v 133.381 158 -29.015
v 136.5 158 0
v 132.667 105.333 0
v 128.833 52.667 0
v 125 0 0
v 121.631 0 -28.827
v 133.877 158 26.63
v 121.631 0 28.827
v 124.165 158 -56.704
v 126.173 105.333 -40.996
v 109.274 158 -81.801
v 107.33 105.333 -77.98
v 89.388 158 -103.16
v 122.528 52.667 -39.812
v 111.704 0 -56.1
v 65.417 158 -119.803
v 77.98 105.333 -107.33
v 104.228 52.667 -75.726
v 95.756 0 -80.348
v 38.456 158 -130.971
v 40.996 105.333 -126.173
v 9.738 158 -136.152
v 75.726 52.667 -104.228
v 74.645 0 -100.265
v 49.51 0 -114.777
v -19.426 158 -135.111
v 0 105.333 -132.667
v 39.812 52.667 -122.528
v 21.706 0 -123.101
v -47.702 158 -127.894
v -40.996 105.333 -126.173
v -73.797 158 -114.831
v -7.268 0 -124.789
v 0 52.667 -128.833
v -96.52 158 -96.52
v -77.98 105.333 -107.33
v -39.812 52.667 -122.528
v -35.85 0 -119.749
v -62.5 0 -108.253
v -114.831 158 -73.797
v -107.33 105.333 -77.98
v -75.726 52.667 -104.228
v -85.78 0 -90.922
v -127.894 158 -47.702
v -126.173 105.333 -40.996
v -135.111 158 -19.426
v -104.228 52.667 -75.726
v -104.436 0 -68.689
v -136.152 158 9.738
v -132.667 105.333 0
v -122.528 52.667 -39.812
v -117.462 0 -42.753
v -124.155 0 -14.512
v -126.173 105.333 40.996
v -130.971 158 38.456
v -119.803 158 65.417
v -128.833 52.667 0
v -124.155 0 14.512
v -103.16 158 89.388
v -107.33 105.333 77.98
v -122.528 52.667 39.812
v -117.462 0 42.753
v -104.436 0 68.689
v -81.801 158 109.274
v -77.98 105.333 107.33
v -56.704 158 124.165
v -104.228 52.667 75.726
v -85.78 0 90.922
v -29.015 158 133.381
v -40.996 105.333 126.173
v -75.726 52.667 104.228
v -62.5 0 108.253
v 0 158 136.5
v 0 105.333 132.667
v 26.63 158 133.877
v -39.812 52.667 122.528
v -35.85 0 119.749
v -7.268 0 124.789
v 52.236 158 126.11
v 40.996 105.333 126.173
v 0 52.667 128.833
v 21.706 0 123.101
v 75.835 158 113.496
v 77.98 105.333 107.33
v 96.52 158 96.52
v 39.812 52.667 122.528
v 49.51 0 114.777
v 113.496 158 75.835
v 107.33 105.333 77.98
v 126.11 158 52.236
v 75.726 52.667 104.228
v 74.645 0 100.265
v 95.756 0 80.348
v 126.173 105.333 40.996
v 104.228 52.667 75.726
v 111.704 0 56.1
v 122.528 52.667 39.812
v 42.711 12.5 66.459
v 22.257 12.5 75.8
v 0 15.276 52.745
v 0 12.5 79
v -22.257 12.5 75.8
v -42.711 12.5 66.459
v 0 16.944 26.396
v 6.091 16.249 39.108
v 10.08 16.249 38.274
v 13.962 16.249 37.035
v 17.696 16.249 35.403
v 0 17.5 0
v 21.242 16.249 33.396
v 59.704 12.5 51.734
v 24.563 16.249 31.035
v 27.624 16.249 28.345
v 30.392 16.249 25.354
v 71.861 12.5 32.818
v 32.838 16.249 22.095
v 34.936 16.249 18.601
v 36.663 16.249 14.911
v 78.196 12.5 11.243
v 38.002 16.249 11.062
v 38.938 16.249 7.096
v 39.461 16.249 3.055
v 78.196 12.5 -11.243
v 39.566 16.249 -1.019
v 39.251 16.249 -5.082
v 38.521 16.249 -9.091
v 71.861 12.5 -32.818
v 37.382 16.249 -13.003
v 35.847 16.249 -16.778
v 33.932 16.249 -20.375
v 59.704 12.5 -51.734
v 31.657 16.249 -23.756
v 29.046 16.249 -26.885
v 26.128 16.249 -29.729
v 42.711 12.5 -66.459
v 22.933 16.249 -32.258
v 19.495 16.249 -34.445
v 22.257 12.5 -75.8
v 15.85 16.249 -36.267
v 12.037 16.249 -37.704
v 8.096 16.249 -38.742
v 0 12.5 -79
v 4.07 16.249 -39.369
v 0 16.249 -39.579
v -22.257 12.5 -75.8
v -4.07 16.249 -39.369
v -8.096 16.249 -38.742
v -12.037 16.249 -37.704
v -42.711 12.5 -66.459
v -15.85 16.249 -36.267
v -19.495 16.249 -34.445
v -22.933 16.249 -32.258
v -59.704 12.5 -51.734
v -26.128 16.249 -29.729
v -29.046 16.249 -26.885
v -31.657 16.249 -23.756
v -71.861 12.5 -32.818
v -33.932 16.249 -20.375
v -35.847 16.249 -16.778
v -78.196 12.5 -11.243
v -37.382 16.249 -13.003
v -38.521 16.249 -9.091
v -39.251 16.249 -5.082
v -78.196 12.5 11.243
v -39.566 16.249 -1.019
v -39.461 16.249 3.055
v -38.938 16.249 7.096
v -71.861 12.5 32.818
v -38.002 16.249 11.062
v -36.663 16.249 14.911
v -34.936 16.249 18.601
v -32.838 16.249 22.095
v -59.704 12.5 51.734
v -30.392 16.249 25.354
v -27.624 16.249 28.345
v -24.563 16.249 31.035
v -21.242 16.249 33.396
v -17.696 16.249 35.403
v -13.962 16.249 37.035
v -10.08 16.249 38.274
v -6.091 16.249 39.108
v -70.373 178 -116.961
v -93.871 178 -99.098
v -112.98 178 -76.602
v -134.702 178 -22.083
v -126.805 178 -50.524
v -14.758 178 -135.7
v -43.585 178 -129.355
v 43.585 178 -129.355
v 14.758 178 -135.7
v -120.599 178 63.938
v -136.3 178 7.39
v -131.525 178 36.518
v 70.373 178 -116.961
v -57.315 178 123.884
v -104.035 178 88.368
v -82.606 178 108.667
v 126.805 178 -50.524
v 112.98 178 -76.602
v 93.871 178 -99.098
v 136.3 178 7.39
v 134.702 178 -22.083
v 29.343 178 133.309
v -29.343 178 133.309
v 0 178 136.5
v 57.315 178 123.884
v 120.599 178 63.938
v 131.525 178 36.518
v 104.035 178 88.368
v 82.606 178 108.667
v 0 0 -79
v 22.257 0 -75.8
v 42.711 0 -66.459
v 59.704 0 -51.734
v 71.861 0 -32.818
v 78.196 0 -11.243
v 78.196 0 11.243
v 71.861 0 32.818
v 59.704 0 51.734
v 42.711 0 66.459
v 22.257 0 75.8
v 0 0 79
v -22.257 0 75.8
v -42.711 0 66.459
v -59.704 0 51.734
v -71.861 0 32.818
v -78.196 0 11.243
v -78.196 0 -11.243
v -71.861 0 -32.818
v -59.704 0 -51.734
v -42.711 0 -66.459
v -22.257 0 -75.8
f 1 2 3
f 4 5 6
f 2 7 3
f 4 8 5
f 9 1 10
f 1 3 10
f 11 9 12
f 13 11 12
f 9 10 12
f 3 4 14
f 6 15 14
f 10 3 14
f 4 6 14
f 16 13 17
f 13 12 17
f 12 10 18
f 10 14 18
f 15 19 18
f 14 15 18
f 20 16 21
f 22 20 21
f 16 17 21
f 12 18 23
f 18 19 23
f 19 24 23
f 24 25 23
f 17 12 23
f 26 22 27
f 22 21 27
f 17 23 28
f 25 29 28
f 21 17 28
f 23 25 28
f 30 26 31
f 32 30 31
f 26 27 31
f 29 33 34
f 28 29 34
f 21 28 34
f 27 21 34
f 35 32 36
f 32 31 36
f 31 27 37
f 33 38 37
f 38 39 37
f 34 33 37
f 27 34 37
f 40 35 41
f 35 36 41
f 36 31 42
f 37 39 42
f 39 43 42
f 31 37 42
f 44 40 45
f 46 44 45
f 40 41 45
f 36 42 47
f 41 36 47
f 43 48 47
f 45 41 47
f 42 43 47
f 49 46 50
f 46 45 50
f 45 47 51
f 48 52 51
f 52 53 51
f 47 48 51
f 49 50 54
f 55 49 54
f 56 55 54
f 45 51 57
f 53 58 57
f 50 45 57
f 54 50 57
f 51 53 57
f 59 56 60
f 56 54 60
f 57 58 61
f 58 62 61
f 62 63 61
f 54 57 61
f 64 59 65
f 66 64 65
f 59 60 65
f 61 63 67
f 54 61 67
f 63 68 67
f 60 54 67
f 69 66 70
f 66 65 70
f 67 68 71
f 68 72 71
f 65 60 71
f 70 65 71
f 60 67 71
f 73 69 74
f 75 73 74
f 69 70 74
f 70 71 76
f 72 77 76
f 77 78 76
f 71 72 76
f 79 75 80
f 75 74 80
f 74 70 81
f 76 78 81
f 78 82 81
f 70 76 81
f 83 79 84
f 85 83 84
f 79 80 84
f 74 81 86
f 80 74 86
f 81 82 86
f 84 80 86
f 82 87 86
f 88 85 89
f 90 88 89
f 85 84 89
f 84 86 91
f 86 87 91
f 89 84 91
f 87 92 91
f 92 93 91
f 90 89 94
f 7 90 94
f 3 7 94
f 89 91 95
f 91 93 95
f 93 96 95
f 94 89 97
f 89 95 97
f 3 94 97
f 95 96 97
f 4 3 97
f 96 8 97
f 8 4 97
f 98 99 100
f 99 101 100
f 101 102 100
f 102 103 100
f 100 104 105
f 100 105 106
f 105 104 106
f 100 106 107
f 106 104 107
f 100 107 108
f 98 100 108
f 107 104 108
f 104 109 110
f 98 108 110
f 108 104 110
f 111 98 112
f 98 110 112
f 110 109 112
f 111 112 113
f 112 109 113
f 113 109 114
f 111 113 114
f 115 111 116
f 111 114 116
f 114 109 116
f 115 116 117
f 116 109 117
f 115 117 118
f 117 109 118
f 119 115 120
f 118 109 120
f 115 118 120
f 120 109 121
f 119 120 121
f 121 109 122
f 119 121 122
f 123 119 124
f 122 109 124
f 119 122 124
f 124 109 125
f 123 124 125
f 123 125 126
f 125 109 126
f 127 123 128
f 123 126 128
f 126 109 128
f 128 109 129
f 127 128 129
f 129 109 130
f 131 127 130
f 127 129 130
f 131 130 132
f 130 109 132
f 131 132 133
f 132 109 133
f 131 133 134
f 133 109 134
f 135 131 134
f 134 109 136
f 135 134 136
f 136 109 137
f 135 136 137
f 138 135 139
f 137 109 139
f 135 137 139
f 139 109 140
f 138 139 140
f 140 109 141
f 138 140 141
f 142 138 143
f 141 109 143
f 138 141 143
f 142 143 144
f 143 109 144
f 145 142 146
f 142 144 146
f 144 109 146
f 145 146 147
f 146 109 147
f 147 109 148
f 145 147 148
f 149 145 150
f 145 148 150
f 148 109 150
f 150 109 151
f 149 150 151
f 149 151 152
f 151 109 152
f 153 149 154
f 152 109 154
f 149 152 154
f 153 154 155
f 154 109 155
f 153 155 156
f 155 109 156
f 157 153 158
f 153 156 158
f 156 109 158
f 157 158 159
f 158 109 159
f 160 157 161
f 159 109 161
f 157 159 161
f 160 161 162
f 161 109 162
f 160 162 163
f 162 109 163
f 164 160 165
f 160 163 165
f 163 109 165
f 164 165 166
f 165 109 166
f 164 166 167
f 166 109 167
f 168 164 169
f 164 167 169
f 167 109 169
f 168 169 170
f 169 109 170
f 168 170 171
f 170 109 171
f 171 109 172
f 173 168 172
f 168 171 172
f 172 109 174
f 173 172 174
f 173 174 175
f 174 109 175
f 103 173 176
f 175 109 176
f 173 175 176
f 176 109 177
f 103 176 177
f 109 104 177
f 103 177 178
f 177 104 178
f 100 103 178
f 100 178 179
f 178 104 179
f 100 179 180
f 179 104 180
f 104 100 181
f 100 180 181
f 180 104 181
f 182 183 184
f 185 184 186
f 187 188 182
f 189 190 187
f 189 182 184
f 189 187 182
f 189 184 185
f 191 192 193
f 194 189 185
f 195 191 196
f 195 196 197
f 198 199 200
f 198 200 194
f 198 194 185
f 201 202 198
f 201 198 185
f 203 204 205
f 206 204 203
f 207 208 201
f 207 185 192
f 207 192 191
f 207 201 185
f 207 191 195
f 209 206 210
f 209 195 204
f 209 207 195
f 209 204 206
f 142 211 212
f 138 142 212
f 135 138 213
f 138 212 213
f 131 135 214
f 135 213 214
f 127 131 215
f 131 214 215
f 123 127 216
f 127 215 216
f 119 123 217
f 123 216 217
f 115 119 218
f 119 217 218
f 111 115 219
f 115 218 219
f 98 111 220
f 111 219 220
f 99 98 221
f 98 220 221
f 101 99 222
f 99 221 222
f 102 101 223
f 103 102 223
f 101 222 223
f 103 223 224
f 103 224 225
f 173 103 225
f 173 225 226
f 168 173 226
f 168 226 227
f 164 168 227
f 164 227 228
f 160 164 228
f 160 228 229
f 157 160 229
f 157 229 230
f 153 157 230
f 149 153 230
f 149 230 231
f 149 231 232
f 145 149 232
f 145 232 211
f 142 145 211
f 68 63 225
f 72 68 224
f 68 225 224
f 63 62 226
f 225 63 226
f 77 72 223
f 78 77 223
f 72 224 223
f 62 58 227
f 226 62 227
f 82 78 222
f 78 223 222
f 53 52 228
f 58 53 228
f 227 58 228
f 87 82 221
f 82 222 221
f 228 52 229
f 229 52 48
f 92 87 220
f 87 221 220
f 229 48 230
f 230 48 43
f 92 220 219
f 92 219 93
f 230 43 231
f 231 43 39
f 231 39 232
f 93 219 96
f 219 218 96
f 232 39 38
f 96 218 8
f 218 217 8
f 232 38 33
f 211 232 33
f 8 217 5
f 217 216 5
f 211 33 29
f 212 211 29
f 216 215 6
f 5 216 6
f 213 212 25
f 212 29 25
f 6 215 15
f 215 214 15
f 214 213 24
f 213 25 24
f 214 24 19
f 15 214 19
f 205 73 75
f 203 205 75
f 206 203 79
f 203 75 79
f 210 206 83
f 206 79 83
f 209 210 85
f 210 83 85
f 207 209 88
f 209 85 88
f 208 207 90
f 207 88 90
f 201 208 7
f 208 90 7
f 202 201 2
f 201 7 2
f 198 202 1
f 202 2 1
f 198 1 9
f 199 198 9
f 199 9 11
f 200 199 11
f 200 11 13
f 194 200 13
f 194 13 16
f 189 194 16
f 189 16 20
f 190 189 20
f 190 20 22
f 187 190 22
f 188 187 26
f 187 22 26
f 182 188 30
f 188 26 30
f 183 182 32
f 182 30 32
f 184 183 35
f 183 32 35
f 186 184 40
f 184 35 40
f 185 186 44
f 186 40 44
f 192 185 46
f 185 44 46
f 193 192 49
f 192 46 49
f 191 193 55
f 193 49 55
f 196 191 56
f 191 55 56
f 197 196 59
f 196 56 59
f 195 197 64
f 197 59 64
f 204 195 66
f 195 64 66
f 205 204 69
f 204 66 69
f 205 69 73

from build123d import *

# Parameters (mm, degrees)
IZIM10_R                    = 136.5
IZIM9_R                     = 125
IZIM11_R                    = 136.5
Y_KSEKLIK_EKSTR_ZYON2_DEPTH = 20
IZIM12_R                    = 79
KES_EKSTR_ZYON3_DEPTH       = 12.5
KUBBE3_FACE_RADIUS          = 79
KUBBE3_HEIGHT               = 5


with BuildPart() as part:
    # Çizim10 → Loft2 section 0
    with BuildSketch(Plane(origin=(0, 158, 0), x_dir=(1, 0, 0), z_dir=(0, 1, 0))):
        Circle(IZIM10_R)
    # Çizim9 → Loft2 section 1
    with BuildSketch(Plane(origin=(0, 0, 0), x_dir=(1, 0, 0), z_dir=(0, 1, 0))):
        Circle(IZIM9_R)
    loft()

    # Çizim11 → Yükseklik-Ekstrüzyon2 (add)
    with BuildSketch(Plane(origin=(0, 158, 0), x_dir=(1, 0, 0), z_dir=(0, 1, 0))):
        with Locations(Location((0, 0, 0), (0, 0, 270))):
            Circle(IZIM11_R)
    extrude(amount=Y_KSEKLIK_EKSTR_ZYON2_DEPTH)

    # Çizim12 → Kes-Ekstrüzyon3 (cut)
    with BuildSketch(Plane.XZ):
        with Locations(Location((0, 0, 0), (0, 0, 270))):
            Circle(IZIM12_R)
    extrude(amount=-KES_EKSTR_ZYON3_DEPTH, mode=Mode.SUBTRACT)

    # Kubbe3: a dome of height H over a round flat face of radius A is a cap of a sphere of radius (A * A + H * H) / (2 * H)
    kubbe3_r = (KUBBE3_FACE_RADIUS * KUBBE3_FACE_RADIUS + KUBBE3_HEIGHT * KUBBE3_HEIGHT) / (2 * KUBBE3_HEIGHT)
    kubbe3_base = Plane((0, 12.5, 0), z_dir=(0, 1, 0))
    with Locations(kubbe3_base.offset(KUBBE3_HEIGHT - kubbe3_r)):
        kubbe3_ball = Sphere(kubbe3_r, mode=Mode.PRIVATE)
    add(split(kubbe3_ball, bisect_by=kubbe3_base, keep=Keep.TOP, mode=Mode.PRIVATE), mode=Mode.SUBTRACT)


solid = part.part
